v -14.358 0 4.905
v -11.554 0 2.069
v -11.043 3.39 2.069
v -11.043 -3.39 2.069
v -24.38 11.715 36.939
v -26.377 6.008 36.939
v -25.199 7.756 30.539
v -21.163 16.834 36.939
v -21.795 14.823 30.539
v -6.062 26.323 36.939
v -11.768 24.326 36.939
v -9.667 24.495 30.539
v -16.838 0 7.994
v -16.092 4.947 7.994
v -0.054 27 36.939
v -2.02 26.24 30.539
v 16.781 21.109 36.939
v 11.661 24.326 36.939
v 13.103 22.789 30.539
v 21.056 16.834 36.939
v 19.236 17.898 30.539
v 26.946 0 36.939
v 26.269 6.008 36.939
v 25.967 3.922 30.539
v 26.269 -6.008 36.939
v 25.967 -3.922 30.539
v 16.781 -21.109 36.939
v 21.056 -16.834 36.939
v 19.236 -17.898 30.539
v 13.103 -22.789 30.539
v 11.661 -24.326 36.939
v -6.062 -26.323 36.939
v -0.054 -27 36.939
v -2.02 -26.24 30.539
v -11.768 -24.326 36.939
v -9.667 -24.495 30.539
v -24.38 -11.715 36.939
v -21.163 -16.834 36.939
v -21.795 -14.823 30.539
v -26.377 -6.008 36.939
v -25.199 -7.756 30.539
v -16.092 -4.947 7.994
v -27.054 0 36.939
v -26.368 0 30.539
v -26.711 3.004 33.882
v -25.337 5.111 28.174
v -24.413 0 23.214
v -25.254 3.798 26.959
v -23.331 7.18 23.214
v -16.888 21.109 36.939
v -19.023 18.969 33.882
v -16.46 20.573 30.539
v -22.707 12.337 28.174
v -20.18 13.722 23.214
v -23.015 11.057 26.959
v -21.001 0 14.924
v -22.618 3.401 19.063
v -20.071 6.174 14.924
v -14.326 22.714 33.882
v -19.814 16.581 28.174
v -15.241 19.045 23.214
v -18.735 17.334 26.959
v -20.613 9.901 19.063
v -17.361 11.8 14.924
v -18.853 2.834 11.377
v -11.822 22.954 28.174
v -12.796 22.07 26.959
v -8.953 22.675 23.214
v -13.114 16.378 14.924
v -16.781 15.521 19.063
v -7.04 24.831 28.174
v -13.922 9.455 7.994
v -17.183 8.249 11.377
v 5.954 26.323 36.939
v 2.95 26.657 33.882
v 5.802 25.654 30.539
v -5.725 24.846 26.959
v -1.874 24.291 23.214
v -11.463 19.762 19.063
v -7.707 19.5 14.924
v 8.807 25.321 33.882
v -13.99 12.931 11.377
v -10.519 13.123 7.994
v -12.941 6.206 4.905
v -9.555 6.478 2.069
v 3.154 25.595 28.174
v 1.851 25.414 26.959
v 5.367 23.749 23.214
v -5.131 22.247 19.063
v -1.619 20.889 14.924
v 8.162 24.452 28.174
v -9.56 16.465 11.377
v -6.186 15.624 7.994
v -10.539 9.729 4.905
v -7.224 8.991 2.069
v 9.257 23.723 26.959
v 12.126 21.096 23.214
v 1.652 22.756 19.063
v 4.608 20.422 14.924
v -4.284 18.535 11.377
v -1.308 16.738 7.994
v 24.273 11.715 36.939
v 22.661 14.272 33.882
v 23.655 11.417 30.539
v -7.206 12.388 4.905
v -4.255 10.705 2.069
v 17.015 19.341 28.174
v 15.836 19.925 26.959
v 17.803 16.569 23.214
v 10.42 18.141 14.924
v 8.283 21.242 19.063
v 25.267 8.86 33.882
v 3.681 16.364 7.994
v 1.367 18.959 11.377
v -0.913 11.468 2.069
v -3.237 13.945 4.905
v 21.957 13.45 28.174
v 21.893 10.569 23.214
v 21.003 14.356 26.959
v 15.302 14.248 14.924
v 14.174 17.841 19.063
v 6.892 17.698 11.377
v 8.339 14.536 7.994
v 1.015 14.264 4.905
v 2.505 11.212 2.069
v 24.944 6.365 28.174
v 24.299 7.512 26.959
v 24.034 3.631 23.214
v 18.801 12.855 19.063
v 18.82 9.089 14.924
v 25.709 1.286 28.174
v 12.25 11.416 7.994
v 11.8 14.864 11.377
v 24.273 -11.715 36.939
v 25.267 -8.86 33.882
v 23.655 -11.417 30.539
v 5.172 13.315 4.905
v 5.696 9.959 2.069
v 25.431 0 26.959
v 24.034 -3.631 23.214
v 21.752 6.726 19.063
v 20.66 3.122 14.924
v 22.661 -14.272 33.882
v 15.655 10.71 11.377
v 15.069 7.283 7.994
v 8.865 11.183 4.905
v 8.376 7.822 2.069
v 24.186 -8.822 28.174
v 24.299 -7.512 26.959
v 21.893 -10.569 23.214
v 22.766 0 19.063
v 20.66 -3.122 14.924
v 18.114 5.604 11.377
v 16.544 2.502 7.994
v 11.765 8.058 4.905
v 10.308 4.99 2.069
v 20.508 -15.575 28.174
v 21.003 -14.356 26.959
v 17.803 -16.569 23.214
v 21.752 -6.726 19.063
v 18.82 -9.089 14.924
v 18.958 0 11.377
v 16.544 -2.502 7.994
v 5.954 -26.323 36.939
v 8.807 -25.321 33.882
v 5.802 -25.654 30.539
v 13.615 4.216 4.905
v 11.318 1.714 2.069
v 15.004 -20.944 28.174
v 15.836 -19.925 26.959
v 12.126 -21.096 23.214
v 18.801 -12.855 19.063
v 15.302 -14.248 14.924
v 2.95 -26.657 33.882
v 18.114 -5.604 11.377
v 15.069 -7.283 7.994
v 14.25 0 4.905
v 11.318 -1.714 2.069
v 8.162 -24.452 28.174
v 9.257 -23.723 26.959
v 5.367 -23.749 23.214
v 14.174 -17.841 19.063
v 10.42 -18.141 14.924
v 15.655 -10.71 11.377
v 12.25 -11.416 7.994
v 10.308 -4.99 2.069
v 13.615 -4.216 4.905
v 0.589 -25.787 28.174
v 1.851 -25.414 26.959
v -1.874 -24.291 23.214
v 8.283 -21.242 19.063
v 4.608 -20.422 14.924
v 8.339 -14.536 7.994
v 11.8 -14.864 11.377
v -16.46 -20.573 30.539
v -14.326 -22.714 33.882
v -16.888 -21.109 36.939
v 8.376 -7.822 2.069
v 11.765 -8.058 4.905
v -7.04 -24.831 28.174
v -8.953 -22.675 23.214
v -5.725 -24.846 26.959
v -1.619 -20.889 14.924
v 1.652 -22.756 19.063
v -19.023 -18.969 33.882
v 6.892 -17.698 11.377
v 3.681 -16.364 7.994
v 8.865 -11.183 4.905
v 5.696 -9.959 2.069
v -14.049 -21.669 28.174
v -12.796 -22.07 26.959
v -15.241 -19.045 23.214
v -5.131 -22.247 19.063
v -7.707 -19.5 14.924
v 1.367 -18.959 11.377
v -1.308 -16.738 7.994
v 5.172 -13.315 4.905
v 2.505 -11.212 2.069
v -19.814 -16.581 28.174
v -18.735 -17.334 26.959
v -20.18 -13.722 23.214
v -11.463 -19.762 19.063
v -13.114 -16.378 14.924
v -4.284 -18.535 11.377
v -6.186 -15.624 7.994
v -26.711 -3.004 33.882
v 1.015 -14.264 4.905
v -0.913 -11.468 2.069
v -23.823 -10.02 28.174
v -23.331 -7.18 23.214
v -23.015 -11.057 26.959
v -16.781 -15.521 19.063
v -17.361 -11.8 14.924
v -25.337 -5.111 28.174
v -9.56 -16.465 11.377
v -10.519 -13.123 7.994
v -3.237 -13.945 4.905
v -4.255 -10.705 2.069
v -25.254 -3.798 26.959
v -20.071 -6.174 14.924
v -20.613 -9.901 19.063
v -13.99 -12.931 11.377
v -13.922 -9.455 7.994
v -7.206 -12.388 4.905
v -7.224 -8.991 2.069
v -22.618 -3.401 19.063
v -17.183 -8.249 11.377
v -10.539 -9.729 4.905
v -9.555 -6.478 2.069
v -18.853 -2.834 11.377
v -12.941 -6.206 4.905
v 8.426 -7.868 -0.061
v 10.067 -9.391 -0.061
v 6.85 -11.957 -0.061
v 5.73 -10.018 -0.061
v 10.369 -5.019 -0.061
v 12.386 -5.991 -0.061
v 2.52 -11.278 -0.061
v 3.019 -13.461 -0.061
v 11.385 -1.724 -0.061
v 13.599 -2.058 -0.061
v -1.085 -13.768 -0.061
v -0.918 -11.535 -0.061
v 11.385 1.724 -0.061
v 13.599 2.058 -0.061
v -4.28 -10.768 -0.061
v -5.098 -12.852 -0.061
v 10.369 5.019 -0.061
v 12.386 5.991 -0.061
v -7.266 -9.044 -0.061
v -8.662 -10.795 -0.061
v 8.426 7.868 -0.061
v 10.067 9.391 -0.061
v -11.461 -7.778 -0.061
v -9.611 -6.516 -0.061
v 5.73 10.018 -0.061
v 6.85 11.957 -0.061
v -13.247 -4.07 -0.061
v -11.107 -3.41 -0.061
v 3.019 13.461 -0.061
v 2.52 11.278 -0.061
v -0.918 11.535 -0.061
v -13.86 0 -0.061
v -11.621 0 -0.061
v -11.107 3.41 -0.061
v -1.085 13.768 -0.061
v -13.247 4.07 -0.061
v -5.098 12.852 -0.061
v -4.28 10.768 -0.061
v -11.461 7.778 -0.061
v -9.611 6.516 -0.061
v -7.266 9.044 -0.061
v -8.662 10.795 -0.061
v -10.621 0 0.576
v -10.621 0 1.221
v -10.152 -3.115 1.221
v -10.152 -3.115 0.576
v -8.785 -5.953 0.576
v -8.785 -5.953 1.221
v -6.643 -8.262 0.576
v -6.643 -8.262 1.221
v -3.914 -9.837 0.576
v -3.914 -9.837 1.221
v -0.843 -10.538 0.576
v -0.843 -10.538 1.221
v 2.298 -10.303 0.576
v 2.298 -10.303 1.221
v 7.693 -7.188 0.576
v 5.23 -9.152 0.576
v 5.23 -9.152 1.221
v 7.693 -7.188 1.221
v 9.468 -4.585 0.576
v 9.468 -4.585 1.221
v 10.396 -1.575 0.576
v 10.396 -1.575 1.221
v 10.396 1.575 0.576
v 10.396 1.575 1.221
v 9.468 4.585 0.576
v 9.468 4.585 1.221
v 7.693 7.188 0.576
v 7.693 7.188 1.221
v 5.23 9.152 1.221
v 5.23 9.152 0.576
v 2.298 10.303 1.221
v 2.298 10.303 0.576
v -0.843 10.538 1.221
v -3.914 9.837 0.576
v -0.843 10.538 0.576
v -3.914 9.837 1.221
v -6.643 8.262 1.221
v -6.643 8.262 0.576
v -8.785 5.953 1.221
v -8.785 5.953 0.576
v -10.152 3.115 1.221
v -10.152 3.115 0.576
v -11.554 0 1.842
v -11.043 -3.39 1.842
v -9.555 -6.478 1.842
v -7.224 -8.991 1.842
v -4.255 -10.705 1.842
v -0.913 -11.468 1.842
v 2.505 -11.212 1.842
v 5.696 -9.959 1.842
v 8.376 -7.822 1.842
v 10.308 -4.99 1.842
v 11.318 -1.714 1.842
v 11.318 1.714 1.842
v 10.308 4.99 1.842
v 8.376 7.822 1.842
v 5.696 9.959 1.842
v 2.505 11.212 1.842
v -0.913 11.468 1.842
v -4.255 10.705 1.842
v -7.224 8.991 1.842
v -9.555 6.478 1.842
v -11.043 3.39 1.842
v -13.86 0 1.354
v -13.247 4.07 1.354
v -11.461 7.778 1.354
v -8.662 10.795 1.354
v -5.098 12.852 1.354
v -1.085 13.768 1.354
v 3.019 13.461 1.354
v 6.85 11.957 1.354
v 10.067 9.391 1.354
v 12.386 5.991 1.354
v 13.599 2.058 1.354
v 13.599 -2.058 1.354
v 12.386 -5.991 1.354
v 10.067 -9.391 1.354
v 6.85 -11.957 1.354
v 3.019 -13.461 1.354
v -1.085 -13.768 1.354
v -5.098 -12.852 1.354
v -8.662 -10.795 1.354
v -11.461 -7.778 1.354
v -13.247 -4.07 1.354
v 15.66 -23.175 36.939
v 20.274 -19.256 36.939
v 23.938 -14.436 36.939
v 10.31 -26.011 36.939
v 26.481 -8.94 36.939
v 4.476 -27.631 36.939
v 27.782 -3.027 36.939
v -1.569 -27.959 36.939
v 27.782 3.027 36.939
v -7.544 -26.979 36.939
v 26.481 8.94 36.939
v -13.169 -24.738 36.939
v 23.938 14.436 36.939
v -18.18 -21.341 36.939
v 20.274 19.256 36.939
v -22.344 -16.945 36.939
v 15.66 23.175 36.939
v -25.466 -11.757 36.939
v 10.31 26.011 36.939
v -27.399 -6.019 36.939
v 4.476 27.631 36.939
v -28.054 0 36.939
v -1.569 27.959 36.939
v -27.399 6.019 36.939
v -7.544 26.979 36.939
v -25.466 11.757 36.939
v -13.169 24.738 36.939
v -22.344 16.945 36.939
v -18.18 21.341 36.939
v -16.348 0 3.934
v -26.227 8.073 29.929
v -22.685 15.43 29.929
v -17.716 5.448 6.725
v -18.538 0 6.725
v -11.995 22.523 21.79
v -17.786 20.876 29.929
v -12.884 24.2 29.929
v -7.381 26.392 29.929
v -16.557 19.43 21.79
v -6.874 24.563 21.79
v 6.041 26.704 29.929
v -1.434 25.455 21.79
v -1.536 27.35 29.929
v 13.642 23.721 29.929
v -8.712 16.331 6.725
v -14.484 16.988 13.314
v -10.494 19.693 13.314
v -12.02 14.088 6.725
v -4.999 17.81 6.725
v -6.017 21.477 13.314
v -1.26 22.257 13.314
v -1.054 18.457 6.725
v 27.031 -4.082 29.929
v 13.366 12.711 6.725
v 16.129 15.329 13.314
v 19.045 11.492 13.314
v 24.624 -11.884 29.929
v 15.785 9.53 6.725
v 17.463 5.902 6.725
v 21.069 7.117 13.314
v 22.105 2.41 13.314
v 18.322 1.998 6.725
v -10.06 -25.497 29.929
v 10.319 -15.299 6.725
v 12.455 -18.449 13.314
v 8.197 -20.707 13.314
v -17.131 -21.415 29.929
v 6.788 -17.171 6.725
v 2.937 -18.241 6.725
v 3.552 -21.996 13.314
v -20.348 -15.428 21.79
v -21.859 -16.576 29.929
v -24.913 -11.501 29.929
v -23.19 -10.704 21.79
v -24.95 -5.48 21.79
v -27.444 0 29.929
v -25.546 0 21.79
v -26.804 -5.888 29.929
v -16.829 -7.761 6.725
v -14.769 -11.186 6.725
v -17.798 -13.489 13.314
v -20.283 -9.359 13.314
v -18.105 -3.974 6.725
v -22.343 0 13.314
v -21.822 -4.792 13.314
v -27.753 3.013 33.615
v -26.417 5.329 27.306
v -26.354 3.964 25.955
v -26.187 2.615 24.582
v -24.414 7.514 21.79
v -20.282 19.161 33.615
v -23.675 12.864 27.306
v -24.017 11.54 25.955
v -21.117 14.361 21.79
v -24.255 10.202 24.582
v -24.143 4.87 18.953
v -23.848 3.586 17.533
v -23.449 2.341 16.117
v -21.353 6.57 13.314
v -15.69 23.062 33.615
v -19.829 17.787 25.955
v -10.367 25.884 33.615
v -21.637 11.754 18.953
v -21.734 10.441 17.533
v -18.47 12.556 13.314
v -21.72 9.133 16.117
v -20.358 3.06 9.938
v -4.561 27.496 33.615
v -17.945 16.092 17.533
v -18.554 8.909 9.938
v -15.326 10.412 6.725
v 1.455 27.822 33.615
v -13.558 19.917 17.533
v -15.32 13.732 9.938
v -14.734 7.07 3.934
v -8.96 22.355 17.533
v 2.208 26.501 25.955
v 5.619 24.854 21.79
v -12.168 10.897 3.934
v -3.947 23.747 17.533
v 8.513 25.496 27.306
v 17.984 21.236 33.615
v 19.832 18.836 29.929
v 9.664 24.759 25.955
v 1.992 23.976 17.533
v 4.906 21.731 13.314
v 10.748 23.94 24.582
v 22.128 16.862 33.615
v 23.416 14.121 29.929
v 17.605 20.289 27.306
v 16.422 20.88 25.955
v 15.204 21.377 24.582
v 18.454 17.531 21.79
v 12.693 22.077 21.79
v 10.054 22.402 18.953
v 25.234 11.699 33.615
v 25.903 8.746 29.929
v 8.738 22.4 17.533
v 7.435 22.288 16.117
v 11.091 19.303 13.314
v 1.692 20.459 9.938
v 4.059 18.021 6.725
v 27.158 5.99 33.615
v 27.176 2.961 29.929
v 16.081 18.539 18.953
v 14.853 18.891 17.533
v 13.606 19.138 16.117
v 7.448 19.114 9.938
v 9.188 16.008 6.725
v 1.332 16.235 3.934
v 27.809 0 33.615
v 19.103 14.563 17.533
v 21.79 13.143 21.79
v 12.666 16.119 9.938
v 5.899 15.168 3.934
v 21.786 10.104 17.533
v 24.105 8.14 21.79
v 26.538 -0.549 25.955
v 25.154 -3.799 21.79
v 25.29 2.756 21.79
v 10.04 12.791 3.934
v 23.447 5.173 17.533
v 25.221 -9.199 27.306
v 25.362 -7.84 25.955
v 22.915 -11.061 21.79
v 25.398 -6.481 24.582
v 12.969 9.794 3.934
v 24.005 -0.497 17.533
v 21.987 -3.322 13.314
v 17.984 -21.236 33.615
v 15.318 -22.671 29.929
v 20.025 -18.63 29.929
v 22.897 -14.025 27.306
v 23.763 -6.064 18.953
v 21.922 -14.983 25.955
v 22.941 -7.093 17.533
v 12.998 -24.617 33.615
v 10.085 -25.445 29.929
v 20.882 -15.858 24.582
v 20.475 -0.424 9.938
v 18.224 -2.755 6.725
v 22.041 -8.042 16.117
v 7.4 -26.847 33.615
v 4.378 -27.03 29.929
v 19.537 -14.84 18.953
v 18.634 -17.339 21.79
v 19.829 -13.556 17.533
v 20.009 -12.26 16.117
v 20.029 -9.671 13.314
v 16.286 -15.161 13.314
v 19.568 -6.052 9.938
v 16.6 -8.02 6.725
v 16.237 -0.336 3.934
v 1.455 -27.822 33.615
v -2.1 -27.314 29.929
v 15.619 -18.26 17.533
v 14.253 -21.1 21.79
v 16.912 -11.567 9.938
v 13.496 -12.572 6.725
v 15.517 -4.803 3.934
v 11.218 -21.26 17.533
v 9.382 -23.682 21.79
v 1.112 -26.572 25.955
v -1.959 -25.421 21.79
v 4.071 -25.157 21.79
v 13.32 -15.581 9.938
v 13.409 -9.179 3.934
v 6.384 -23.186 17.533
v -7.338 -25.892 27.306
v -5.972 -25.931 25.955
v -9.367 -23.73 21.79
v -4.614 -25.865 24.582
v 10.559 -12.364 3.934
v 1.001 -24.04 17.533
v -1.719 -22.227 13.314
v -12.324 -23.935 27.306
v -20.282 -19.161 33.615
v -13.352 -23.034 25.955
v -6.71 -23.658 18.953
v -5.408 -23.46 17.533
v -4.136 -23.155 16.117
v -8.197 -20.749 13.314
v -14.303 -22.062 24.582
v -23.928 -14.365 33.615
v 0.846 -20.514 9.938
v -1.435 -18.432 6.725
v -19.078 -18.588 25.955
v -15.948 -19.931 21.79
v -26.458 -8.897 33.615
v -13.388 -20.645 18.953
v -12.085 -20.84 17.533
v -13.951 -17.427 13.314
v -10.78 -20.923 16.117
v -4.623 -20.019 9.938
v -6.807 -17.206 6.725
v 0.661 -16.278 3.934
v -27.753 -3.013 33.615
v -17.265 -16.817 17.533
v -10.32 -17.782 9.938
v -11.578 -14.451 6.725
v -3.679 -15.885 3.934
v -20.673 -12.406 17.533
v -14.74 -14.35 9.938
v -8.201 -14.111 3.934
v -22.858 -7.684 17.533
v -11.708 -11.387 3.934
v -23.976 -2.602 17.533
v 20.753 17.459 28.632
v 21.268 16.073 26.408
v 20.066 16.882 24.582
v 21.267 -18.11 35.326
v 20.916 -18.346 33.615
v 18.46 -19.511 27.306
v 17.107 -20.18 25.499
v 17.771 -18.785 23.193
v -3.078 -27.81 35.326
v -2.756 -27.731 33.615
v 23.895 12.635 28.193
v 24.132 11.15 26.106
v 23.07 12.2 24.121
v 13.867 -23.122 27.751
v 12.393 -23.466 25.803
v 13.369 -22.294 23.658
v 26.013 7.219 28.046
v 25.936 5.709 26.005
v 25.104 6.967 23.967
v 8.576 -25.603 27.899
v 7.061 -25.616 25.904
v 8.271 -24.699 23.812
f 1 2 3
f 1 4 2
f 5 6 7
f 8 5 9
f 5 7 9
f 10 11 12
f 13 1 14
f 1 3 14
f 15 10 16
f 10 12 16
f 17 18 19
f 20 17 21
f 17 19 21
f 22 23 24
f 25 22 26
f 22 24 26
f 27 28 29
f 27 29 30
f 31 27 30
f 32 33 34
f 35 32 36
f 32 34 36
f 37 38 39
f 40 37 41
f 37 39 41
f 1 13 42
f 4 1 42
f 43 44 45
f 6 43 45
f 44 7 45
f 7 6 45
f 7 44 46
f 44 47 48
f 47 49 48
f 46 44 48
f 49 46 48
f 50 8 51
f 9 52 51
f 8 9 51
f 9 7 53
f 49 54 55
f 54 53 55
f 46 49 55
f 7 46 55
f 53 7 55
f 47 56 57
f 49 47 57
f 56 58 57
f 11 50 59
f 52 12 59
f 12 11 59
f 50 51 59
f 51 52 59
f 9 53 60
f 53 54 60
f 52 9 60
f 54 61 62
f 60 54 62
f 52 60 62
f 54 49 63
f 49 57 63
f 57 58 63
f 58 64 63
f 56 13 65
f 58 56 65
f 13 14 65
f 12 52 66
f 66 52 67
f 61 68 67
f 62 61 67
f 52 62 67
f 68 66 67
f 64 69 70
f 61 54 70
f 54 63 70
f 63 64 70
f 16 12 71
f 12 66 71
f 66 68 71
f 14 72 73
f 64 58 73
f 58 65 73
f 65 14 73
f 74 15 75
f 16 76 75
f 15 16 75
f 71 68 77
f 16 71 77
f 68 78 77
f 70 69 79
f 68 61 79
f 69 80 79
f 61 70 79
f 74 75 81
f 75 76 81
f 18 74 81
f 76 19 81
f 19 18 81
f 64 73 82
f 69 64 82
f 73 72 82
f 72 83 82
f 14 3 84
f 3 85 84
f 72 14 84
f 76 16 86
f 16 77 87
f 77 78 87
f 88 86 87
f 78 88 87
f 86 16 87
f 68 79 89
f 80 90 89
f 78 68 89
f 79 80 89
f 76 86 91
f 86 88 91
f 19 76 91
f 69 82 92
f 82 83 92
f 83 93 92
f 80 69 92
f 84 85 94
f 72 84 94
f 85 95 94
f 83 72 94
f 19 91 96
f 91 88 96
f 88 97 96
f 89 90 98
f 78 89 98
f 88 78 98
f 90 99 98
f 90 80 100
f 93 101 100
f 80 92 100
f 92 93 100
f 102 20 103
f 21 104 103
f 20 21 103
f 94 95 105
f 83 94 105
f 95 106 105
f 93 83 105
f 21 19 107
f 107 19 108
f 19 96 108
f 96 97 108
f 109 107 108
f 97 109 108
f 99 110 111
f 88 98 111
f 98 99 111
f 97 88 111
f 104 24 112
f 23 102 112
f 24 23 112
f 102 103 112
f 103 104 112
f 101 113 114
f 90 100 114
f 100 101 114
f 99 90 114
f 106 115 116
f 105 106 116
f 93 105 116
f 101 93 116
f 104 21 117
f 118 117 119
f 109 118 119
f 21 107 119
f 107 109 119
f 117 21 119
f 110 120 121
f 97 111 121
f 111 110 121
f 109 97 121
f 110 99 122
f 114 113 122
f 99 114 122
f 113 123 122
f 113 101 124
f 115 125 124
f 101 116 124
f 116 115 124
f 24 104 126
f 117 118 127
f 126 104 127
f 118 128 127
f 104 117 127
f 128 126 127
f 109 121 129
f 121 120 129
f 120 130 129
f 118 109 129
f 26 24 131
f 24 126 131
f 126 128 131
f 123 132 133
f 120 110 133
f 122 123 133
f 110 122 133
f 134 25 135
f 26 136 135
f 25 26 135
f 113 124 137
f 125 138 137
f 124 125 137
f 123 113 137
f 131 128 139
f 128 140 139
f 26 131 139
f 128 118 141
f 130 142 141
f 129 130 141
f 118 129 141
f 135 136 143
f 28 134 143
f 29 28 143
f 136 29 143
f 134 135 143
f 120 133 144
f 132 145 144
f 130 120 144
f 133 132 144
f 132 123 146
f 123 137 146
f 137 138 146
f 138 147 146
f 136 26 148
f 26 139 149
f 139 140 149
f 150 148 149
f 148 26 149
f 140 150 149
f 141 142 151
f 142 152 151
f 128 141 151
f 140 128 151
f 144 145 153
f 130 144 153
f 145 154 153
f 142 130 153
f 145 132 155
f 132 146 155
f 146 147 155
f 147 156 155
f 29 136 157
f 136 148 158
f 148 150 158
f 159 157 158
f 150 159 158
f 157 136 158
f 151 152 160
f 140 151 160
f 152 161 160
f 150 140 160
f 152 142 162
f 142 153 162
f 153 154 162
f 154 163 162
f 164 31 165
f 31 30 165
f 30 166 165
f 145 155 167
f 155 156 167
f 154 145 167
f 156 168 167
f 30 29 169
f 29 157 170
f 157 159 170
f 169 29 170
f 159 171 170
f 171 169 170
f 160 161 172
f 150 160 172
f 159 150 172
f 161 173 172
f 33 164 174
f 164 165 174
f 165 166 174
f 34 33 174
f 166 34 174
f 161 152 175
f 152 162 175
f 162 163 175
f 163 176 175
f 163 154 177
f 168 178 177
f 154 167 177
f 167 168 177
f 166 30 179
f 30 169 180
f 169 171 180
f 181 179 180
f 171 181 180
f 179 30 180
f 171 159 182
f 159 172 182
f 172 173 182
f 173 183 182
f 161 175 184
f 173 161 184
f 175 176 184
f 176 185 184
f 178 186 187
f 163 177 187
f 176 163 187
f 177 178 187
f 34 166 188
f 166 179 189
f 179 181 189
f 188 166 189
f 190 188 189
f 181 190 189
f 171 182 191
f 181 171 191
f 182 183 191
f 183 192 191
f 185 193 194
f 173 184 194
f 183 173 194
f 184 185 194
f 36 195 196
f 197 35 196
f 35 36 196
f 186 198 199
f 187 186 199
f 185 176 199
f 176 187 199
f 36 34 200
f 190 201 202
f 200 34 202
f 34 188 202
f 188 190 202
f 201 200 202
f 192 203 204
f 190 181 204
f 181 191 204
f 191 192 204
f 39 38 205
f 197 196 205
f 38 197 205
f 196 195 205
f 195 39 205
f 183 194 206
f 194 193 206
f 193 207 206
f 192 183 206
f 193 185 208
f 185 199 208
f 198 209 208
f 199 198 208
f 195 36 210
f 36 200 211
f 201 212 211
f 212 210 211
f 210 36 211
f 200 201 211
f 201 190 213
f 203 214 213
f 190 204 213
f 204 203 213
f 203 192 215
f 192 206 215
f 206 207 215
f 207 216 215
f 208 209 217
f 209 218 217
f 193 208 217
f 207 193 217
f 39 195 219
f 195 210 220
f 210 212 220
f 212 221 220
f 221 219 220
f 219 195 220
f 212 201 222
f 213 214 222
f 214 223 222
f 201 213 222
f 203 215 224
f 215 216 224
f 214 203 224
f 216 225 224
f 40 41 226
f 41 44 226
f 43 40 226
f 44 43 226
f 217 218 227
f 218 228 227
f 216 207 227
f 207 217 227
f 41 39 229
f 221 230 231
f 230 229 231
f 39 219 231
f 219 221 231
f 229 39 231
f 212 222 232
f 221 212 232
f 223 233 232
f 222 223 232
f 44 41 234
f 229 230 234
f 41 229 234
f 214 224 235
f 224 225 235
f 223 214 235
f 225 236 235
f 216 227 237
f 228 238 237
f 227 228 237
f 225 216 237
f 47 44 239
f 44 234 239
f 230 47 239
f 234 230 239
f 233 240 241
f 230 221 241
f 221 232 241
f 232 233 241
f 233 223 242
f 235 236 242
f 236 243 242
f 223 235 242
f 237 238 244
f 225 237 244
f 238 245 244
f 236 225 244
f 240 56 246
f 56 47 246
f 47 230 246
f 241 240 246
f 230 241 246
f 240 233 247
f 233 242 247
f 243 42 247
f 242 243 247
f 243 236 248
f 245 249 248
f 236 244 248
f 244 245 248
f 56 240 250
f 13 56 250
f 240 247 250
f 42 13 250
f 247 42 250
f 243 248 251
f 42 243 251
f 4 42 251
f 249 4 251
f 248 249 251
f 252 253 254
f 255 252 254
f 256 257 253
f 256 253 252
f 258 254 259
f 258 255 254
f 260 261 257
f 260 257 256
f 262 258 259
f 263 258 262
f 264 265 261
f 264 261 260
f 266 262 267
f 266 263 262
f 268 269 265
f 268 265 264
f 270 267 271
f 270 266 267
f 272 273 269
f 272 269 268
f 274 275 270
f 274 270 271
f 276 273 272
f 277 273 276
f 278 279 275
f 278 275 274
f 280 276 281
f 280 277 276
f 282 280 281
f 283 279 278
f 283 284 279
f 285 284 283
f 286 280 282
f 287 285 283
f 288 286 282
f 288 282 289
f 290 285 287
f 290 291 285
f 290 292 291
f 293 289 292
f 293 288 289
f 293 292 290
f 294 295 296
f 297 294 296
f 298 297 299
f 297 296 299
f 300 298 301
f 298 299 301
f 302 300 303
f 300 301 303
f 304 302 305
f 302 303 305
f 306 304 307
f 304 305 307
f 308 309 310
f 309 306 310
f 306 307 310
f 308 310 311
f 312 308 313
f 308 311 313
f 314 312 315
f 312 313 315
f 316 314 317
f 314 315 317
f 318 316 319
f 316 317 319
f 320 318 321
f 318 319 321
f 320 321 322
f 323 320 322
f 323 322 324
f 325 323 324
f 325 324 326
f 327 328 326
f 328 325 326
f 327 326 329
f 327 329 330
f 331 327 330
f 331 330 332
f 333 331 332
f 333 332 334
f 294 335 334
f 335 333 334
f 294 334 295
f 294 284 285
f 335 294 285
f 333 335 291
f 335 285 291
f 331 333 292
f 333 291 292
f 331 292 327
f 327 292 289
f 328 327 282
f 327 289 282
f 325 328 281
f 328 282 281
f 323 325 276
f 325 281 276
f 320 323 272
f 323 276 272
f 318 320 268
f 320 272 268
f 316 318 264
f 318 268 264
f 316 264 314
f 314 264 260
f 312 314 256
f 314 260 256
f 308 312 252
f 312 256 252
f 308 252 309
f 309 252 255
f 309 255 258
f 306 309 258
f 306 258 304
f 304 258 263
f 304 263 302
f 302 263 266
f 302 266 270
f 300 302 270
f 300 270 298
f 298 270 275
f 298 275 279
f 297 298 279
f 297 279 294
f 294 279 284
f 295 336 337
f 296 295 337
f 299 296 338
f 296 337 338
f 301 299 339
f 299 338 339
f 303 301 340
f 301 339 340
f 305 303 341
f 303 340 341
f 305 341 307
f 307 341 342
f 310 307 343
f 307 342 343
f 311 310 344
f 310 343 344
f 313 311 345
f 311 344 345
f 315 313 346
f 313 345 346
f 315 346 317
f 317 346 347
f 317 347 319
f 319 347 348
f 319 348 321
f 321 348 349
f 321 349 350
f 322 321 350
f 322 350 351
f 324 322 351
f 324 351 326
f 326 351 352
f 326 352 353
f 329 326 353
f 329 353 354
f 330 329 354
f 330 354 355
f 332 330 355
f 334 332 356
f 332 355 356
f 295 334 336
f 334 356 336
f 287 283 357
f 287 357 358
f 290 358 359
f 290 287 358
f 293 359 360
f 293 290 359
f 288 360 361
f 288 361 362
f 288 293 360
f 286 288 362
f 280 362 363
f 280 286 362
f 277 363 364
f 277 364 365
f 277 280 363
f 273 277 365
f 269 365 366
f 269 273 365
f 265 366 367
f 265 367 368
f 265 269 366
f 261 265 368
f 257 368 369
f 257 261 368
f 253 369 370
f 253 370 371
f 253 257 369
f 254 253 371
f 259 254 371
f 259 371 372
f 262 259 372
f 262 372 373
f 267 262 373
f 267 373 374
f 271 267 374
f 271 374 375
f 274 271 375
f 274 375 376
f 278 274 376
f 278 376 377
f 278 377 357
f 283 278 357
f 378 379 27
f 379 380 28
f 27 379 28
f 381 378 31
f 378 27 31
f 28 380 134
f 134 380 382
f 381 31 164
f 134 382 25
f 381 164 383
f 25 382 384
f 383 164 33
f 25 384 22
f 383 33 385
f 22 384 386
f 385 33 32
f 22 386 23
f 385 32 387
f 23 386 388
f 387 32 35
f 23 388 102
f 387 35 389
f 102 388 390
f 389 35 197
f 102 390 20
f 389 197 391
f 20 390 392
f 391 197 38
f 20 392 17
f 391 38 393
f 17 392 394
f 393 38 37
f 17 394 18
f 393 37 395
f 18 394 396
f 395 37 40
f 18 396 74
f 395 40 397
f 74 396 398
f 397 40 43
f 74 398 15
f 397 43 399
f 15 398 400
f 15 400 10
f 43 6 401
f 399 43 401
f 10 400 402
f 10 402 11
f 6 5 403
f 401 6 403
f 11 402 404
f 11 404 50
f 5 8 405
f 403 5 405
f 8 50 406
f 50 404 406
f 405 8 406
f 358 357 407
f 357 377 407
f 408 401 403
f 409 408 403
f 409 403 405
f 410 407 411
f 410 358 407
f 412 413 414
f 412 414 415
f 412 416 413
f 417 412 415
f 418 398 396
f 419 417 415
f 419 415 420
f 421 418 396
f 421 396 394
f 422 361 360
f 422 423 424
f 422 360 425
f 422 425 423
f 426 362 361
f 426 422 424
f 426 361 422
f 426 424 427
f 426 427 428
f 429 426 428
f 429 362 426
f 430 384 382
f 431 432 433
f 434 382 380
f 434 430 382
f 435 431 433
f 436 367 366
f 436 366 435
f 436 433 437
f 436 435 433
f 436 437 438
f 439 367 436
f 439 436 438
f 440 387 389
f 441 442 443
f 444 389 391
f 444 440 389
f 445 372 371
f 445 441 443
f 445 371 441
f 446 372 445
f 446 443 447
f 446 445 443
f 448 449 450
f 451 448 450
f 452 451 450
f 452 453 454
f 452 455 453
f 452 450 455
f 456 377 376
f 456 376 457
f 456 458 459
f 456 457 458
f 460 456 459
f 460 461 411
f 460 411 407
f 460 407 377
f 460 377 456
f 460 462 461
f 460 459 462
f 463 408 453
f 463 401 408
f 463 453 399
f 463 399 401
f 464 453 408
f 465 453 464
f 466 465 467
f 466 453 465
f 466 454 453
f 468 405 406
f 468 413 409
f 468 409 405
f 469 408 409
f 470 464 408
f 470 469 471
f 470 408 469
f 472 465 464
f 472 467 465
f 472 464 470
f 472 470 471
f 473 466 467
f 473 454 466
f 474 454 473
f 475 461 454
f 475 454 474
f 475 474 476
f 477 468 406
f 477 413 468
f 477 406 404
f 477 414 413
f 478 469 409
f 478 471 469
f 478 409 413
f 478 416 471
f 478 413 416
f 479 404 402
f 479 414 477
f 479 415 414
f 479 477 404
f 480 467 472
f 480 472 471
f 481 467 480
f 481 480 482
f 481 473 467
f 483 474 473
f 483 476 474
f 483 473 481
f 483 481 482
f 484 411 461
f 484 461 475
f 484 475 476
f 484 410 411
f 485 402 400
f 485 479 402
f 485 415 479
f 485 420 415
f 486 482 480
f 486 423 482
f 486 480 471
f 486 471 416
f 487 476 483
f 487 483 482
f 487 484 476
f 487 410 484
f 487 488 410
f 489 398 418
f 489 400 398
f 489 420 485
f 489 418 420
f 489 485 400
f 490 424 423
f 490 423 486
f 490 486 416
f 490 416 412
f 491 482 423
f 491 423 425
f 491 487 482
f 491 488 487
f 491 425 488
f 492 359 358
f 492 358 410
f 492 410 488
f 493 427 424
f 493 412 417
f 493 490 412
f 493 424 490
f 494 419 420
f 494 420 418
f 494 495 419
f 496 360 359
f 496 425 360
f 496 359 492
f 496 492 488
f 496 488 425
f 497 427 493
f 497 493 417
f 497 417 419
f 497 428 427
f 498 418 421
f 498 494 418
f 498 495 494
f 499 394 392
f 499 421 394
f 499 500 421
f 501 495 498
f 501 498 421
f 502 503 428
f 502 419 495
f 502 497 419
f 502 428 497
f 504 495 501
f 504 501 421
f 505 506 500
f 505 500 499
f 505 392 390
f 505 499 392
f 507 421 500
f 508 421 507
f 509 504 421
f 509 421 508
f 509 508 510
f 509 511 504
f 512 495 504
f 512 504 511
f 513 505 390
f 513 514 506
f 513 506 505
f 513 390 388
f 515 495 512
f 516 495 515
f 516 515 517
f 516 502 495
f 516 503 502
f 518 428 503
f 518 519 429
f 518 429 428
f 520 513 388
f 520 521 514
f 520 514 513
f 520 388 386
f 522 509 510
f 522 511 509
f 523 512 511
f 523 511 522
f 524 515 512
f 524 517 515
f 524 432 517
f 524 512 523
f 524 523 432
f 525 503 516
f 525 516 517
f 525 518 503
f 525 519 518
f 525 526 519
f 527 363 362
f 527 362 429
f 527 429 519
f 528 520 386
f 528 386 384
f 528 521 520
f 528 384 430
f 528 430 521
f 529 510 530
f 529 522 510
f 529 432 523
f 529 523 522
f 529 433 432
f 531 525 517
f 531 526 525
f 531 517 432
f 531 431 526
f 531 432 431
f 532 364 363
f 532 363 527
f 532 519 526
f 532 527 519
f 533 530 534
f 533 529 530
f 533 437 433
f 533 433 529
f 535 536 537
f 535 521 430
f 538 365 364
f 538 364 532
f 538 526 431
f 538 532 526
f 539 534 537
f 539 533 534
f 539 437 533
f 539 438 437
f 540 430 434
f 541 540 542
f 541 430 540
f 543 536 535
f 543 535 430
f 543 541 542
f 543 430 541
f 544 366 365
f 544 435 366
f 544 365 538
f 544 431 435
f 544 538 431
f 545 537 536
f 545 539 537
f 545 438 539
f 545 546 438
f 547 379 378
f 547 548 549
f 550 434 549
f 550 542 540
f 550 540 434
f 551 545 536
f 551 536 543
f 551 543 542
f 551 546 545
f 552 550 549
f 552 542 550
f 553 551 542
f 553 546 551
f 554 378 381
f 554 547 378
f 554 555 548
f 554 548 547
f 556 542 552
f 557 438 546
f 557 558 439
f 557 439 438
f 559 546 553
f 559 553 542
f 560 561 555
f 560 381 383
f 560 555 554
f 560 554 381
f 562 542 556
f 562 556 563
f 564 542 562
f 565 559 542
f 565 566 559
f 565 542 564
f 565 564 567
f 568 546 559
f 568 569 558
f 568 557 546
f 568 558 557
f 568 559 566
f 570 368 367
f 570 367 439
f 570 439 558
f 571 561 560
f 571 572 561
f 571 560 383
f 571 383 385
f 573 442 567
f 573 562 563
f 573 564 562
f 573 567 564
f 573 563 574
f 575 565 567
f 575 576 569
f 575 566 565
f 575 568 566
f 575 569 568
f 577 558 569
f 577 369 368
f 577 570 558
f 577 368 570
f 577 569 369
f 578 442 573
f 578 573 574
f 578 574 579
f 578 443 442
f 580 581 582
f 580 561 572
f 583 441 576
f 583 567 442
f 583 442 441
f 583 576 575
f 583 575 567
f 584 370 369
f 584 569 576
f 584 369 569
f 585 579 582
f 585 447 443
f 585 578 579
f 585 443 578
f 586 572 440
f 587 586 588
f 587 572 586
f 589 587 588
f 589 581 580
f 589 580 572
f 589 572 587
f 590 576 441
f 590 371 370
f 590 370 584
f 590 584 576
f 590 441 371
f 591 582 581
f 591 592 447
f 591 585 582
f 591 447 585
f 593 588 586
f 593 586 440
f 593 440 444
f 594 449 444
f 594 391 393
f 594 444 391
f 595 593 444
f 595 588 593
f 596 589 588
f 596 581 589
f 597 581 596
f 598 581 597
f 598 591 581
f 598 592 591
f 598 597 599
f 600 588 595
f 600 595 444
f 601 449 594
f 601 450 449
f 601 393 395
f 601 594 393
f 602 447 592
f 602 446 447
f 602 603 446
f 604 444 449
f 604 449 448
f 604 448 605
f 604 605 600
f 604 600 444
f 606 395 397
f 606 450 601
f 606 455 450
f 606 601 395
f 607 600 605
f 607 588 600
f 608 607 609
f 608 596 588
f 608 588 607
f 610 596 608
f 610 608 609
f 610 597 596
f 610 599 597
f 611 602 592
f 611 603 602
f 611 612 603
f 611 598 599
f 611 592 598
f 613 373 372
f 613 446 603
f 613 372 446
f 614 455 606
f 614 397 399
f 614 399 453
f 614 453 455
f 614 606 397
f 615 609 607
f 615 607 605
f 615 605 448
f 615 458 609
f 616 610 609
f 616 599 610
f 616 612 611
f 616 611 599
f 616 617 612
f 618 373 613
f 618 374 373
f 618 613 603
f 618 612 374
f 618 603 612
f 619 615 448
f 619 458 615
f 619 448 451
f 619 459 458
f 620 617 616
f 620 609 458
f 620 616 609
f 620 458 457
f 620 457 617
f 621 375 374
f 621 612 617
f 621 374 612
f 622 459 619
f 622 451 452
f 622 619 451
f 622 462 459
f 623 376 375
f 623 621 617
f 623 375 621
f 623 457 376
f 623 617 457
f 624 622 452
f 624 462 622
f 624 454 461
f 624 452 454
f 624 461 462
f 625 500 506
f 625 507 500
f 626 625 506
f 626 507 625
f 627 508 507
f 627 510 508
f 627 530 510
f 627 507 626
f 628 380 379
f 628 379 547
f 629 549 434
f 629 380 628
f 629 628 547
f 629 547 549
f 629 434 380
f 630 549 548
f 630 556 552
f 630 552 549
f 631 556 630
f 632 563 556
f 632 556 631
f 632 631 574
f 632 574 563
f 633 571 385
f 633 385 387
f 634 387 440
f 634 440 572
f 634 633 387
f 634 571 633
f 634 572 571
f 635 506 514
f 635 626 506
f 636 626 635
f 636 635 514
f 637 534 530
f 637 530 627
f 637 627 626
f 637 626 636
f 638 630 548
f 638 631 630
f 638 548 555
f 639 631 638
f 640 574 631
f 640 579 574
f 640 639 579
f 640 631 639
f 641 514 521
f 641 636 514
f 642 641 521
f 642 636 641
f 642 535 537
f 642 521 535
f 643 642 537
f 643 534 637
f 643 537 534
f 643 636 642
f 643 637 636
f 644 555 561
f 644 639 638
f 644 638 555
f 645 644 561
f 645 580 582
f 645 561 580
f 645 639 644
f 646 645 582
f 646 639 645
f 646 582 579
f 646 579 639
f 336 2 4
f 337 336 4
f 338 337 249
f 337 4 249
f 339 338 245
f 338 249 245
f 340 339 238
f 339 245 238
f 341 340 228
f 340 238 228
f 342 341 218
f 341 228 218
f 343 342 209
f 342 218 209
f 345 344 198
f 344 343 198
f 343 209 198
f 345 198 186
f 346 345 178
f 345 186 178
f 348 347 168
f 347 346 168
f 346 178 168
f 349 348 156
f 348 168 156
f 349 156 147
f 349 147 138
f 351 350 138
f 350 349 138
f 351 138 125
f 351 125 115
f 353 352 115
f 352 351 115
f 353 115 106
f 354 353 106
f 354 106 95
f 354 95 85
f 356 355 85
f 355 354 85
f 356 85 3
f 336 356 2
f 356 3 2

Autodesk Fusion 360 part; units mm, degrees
sketch "Sketch1" plane through (0, 0, 0) normal (0, 1, 0) x (1, 0, 0)
  line L0 (-0.0536, -61.5771) -> (-0.0536, 35.4229) construction
  spline S0 degree 5 poles (-28.0536, -36.939) (-28.0663, -35.7869) (-27.9746, -33.3482) (-27.4866, -29.2872) (-26.1883, -23.2234) (-23.5413, -15.2455) (-20.4715, -9.1418) (-17.4725, -5.0243) (-15.1228, -2.5348) (-13.8603, -1.354) knots 0 0 0 0 0 0 0.2 0.4 0.6 0.8 1 1 1 1 1 1
  line L1 (-27.9987, -41.939) -> (-28.1085, -31.939)
  line L2 (-19.2881, -6.4304) -> (-8.4326, 3.7224)
  line L3 (-13.8603, -1.354) -> (-13.8603, 0.061)
  line L4 (-13.8603, 0.061) -> (-11.6214, 0.061)
  line L5 (-11.6214, 0.061) -> (-10.6214, -0.5757)
  line L6 (-10.6214, -0.5757) -> (-10.6214, -1.2207)
  line L7 (-11.5536, -1.8425) -> (-11.5536, -2.0689)
  spline S1 degree 5 poles (-27.0536, -36.939) (-27.0536, -35.7848) (-26.9154, -33.3535) (-26.2936, -29.3379) (-24.715, -23.3918) (-21.6612, -15.6099) (-18.3217, -9.6652) (-15.204, -5.6516) (-12.8212, -3.222) (-11.5536, -2.0689) knots 0 0 0 0 0 0 0.2 0.4 0.6 0.8 1 1 1 1 1 1
  line L8 (-27.0537, -41.9415) -> (-27.0536, -31.9365)
  line L9 (-17.0518, -7.0709) -> (-6.0555, 2.9332)
  line L10 (-28.0536, -36.939) -> (-27.0536, -36.939)
  line L11 (-11.5536, -1.8425) -> (-10.6214, -1.2207)
  dimension "d7" = 37
  dimension "d8" = 11.5
  dimension "d9" = 27
  dimension "d10" = 1
  dimension "d11" = 1
  dimension "d12" = 3.2389
  dimension "d13" = 2.3067
revolve "Revolve1" add sketch "Sketch1" angle 360 about axis through (-0.0536, 0, 61.5771) along (0, 0, -1) contours S0 L2 L4 L5 L6 L7 S1 L10 L11 | L2 L3 L4
